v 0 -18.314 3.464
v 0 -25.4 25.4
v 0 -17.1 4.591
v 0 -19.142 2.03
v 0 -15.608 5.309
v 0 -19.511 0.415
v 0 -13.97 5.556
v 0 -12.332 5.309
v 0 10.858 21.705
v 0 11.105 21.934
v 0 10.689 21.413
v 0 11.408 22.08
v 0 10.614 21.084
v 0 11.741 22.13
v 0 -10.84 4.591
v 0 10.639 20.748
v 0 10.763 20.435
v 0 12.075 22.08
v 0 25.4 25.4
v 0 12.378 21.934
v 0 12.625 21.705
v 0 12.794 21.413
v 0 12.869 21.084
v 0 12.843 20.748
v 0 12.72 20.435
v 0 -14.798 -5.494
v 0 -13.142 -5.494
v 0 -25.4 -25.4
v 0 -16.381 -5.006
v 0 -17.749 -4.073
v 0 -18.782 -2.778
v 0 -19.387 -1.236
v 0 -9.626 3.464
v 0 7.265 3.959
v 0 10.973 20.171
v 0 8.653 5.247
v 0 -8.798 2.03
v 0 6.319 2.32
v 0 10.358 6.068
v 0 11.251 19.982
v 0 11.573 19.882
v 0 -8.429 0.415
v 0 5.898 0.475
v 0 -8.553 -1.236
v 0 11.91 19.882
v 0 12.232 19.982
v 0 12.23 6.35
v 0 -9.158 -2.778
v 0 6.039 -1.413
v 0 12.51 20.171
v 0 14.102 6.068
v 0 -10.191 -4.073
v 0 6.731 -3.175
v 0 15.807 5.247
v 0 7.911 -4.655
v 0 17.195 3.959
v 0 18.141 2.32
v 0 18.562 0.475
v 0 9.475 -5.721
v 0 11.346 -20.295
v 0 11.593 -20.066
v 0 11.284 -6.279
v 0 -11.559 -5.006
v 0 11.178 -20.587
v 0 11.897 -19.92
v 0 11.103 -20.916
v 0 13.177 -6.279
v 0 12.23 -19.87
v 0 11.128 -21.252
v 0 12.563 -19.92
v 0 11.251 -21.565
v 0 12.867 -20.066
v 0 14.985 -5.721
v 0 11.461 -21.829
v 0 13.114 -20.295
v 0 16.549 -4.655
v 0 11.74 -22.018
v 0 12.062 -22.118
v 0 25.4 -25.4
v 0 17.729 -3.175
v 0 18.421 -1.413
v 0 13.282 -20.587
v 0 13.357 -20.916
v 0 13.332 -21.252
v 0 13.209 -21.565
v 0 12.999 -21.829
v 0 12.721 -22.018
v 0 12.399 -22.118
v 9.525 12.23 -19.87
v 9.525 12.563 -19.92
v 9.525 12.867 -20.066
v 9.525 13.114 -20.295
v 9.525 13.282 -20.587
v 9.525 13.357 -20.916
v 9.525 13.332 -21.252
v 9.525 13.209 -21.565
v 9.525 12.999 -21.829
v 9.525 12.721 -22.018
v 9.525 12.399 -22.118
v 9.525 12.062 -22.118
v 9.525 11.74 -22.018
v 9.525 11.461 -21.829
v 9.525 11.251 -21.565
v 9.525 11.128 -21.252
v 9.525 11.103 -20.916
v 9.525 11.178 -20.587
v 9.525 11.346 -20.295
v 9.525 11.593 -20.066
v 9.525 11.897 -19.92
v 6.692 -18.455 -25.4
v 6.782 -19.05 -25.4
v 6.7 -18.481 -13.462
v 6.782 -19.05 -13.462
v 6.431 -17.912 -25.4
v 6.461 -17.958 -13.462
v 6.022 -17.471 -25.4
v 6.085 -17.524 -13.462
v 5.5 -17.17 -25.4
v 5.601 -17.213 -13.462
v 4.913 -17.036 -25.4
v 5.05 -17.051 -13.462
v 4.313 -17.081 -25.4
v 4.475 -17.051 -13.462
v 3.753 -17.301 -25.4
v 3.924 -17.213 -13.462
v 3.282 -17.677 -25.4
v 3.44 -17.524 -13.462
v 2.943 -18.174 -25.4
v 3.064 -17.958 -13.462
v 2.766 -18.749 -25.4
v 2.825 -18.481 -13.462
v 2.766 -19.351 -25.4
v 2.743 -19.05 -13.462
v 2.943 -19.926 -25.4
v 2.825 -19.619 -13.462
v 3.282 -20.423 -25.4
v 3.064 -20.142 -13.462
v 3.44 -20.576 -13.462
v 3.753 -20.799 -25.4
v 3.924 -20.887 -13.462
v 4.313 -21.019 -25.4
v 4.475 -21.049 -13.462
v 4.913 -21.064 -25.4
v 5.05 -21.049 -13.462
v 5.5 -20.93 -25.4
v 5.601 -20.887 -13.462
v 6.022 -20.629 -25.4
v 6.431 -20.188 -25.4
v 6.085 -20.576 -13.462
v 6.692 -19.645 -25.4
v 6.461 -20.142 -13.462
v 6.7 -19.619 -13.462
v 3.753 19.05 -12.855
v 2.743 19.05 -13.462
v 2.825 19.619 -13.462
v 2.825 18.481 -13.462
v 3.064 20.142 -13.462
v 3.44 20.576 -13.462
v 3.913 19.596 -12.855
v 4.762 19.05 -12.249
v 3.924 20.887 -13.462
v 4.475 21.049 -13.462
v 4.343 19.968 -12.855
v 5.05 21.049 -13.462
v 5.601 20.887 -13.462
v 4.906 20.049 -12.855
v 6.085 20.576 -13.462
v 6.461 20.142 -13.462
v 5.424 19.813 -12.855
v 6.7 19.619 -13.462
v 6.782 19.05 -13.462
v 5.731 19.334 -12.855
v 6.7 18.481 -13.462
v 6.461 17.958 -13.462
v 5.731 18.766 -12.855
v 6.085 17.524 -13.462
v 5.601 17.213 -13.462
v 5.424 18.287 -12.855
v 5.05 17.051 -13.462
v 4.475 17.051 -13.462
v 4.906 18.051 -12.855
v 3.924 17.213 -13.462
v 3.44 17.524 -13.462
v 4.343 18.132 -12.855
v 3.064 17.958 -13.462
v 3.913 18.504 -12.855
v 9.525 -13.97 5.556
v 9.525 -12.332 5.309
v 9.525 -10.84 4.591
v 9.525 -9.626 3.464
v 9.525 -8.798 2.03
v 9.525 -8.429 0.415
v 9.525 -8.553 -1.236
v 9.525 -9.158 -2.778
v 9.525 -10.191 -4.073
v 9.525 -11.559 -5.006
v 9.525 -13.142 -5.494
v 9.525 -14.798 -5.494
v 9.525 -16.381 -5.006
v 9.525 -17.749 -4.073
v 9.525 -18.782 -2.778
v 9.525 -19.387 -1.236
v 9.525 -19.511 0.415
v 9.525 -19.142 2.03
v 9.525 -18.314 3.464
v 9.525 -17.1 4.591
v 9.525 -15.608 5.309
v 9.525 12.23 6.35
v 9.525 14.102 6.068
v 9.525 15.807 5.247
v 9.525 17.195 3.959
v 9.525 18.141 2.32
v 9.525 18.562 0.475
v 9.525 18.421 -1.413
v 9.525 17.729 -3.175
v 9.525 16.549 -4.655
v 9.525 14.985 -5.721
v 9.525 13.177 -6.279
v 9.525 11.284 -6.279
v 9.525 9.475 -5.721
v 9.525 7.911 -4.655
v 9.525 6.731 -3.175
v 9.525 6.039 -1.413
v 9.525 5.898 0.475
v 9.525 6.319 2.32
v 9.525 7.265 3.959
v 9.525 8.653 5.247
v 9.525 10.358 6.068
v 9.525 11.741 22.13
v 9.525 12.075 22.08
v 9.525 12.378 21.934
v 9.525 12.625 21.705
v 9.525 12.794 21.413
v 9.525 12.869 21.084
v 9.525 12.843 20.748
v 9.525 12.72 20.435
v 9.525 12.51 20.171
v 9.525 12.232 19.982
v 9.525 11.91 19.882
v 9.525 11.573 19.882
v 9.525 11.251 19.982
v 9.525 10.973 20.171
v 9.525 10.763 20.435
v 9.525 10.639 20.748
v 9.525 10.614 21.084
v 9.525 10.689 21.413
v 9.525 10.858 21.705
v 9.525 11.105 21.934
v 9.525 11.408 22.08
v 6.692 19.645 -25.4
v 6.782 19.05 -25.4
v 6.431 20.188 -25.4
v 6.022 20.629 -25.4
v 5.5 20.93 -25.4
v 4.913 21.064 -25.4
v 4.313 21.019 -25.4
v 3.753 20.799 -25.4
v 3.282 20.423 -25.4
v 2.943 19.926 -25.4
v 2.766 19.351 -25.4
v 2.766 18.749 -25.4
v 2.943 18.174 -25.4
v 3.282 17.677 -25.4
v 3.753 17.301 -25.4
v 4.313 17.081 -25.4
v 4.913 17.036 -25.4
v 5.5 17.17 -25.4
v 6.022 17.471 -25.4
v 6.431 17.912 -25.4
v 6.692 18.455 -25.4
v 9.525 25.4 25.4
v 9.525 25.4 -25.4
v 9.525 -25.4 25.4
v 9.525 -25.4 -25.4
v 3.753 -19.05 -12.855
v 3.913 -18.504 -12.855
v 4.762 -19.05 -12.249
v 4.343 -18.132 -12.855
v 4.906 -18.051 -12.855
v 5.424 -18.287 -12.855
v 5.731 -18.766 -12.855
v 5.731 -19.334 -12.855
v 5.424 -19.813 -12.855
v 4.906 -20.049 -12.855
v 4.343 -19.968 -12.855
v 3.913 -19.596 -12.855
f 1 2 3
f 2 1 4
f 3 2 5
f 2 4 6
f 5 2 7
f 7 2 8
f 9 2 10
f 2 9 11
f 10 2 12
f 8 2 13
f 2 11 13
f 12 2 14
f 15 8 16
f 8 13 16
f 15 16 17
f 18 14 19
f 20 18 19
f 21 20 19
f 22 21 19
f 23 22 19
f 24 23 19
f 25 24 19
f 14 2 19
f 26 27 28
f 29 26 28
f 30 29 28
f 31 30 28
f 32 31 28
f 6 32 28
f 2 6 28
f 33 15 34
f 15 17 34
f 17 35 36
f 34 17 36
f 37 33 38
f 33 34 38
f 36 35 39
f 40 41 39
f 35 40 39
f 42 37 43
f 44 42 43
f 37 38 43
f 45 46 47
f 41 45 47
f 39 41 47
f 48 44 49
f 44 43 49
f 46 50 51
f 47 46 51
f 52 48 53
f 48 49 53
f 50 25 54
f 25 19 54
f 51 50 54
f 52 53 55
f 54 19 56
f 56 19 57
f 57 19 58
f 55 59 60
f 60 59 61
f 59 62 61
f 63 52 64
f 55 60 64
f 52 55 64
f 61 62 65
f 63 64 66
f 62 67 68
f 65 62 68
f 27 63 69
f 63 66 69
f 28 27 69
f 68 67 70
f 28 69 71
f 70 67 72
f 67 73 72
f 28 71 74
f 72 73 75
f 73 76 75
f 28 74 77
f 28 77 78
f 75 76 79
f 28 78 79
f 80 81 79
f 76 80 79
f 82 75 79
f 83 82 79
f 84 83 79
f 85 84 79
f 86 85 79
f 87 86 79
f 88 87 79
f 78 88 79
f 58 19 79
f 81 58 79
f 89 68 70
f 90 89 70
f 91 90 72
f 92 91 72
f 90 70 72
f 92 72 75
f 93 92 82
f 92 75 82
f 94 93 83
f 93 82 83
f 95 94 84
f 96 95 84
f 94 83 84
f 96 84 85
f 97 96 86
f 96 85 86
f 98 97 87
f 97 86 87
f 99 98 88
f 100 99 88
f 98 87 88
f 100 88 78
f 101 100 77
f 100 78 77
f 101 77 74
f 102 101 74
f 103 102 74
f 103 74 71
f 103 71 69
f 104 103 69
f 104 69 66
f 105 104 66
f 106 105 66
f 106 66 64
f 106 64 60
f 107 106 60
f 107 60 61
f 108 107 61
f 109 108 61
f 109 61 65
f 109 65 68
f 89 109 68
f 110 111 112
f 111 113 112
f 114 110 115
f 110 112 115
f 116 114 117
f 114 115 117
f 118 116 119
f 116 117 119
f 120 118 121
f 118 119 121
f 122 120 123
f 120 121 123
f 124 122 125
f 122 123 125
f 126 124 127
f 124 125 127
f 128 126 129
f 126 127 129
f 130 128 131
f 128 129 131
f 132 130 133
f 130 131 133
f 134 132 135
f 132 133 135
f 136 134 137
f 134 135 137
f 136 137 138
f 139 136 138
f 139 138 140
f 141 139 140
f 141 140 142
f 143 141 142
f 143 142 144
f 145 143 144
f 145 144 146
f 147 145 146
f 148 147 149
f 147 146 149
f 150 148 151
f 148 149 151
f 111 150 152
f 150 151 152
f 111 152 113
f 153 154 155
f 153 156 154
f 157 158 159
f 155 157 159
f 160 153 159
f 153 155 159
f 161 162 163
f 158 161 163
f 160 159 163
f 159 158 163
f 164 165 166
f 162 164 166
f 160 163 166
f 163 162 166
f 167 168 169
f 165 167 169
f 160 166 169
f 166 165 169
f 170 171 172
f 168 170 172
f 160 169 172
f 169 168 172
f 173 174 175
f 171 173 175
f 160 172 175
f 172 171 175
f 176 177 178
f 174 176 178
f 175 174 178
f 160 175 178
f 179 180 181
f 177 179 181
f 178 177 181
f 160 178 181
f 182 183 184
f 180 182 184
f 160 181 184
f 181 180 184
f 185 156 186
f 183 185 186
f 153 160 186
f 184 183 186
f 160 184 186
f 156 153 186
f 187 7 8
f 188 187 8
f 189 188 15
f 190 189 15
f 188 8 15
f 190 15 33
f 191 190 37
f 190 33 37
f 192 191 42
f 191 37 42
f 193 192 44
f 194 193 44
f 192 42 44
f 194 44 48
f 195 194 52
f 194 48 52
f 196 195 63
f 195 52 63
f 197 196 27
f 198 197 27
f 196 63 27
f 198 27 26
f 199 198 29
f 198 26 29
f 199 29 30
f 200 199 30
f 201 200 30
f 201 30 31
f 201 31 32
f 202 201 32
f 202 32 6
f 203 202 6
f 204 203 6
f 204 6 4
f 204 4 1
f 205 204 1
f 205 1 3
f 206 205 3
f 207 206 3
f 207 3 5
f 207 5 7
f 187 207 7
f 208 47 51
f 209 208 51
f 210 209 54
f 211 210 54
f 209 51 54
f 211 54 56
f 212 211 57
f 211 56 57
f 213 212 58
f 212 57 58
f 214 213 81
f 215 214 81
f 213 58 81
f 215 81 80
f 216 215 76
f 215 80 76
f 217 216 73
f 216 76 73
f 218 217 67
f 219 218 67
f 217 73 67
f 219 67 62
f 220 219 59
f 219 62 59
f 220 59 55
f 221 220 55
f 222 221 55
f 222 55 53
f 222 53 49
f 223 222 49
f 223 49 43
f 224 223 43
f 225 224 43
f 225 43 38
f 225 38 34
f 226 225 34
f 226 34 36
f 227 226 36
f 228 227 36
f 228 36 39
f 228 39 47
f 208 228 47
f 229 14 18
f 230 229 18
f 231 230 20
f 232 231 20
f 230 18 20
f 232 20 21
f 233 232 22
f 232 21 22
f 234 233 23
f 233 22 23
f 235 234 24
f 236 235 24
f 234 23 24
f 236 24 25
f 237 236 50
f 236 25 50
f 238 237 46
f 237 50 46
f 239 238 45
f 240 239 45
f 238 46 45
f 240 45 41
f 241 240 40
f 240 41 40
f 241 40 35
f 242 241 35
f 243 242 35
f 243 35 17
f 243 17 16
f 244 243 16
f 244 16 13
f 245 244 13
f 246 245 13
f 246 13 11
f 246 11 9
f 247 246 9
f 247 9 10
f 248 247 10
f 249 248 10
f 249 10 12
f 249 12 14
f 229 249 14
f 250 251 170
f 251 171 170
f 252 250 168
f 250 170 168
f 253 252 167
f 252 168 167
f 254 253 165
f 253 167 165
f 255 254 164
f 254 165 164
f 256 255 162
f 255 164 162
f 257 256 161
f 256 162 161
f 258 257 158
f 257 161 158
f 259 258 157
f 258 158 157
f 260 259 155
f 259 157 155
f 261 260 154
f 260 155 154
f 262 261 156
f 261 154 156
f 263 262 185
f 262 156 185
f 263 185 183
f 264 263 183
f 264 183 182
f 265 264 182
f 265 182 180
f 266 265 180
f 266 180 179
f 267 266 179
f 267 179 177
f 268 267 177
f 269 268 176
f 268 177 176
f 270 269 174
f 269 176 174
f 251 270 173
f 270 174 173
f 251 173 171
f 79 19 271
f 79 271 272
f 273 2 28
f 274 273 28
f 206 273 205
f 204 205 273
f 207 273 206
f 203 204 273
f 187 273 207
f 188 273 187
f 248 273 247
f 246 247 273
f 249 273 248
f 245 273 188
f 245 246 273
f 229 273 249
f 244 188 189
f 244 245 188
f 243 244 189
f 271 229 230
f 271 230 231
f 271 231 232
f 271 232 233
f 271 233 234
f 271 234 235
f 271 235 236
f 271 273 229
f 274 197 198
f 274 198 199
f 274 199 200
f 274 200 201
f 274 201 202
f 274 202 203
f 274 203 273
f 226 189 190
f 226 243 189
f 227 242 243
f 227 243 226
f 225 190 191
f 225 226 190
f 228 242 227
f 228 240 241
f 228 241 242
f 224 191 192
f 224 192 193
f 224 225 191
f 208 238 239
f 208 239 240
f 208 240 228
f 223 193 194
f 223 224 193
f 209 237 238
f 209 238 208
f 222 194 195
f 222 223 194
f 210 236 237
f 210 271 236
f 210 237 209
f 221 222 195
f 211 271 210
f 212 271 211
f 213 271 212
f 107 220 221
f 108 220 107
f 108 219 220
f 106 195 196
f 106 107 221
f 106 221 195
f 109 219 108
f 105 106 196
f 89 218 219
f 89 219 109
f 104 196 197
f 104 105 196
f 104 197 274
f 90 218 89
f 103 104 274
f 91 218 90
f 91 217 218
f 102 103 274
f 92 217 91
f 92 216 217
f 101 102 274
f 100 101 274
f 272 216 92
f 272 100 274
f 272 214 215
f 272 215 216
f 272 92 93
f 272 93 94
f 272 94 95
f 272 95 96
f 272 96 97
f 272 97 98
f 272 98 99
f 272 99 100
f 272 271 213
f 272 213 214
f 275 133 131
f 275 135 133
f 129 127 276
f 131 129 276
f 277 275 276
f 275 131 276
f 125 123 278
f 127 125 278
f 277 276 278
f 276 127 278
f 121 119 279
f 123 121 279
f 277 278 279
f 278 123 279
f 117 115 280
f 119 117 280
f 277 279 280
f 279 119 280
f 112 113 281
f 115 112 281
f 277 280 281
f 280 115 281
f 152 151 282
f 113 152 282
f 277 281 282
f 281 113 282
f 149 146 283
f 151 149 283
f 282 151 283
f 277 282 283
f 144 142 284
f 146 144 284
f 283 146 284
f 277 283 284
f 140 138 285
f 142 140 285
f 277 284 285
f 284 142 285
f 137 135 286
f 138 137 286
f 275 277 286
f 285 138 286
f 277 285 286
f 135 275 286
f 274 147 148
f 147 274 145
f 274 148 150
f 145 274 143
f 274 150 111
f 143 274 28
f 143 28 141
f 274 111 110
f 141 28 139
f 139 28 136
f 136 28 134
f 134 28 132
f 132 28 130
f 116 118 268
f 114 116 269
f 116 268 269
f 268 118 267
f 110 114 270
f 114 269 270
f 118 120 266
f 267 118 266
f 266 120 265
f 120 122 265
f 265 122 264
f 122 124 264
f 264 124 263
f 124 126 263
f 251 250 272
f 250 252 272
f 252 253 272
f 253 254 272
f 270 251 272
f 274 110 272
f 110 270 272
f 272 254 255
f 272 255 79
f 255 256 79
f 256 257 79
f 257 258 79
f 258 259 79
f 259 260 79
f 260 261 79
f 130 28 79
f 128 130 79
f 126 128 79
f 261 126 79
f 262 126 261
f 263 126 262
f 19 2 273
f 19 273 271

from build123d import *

# Parameters (mm, degrees)
SKETCH1_W                          = 50.8
SKETCH1_H                          = 50.8
BOSS_EXTRUDE1_DEPTH                = 9.525
F_7_16_0_4375_DIAMETER_HOLE1_D     = 11.1125
F_7_16_0_4375_DIAMETER_HOLE1_DEPTH = 70.104
F_7_16_0_4375_DIAMETER_HOLE1_TIP   = 3.338531814
F_1_2_0_5_DIAMETER_HOLE2_D         = 12.7
F_1_2_0_5_DIAMETER_HOLE2_DEPTH     = 70.104
F_1_2_0_5_DIAMETER_HOLE2_TIP       = 3.815464931
F_4_40_TAPPED_HOLE1_D              = 2.2606
F_10_32_TAPPED_HOLE1_D             = 4.0386
F_10_32_TAPPED_HOLE1_DEPTH         = 11.938
F_10_32_TAPPED_HOLE1_TIP           = 1.213317848


with BuildPart() as part:
    # Sketch1 → Boss-Extrude1 (new body)
    with BuildSketch(Plane(origin=(0, 0, 0), x_dir=(0, 0, -1), z_dir=(1, 0, 0))):
        Rectangle(SKETCH1_W, SKETCH1_H)
    extrude(amount=BOSS_EXTRUDE1_DEPTH)

    # 7/16 (0.4375) Diameter Hole1
    with Locations(Plane(origin=(9.525, 0, 0), x_dir=(0, 0, -1), z_dir=(1, 0, 0))):
        with Locations((0, -13.97)):
            Hole(F_7_16_0_4375_DIAMETER_HOLE1_D / 2, depth=F_7_16_0_4375_DIAMETER_HOLE1_DEPTH)
            with Locations((0, 0, -(F_7_16_0_4375_DIAMETER_HOLE1_DEPTH + F_7_16_0_4375_DIAMETER_HOLE1_TIP / 2))):  # 118° drill point
                Cone(0, F_7_16_0_4375_DIAMETER_HOLE1_D / 2, F_7_16_0_4375_DIAMETER_HOLE1_TIP, mode=Mode.SUBTRACT)

    # 1/2 (0.5) Diameter Hole2
    with Locations(Plane(origin=(9.525, 0, 0), x_dir=(0, 0, -1), z_dir=(1, 0, 0))):
        with Locations((0, 12.2301)):
            Hole(F_1_2_0_5_DIAMETER_HOLE2_D / 2, depth=F_1_2_0_5_DIAMETER_HOLE2_DEPTH)
            with Locations((0, 0, -(F_1_2_0_5_DIAMETER_HOLE2_DEPTH + F_1_2_0_5_DIAMETER_HOLE2_TIP / 2))):  # 118° drill point
                Cone(0, F_1_2_0_5_DIAMETER_HOLE2_D / 2, F_1_2_0_5_DIAMETER_HOLE2_TIP, mode=Mode.SUBTRACT)

    # #4-40 Tapped Hole1 (through all)
    with Locations(Plane(origin=(9.525, 0, 0), x_dir=(0, 0, -1), z_dir=(1, 0, 0))):
        with Locations((21, 12.2301), (-21, 11.74145915)):
            Hole(F_4_40_TAPPED_HOLE1_D / 2)

    # #10-32 Tapped Hole1
    with Locations(Plane(origin=(-0.669296778, 7.980106856, -25.4), x_dir=(-1, 0, 0), z_dir=(0, 0, -1))):
        with Locations((-5.431796778, -27.030106856), (-5.431796778, 11.069893144)):
            Hole(F_10_32_TAPPED_HOLE1_D / 2, depth=F_10_32_TAPPED_HOLE1_DEPTH)
            with Locations((0, 0, -(F_10_32_TAPPED_HOLE1_DEPTH + F_10_32_TAPPED_HOLE1_TIP / 2))):  # 118° drill point
                Cone(0, F_10_32_TAPPED_HOLE1_D / 2, F_10_32_TAPPED_HOLE1_TIP, mode=Mode.SUBTRACT)


solid = part.part
